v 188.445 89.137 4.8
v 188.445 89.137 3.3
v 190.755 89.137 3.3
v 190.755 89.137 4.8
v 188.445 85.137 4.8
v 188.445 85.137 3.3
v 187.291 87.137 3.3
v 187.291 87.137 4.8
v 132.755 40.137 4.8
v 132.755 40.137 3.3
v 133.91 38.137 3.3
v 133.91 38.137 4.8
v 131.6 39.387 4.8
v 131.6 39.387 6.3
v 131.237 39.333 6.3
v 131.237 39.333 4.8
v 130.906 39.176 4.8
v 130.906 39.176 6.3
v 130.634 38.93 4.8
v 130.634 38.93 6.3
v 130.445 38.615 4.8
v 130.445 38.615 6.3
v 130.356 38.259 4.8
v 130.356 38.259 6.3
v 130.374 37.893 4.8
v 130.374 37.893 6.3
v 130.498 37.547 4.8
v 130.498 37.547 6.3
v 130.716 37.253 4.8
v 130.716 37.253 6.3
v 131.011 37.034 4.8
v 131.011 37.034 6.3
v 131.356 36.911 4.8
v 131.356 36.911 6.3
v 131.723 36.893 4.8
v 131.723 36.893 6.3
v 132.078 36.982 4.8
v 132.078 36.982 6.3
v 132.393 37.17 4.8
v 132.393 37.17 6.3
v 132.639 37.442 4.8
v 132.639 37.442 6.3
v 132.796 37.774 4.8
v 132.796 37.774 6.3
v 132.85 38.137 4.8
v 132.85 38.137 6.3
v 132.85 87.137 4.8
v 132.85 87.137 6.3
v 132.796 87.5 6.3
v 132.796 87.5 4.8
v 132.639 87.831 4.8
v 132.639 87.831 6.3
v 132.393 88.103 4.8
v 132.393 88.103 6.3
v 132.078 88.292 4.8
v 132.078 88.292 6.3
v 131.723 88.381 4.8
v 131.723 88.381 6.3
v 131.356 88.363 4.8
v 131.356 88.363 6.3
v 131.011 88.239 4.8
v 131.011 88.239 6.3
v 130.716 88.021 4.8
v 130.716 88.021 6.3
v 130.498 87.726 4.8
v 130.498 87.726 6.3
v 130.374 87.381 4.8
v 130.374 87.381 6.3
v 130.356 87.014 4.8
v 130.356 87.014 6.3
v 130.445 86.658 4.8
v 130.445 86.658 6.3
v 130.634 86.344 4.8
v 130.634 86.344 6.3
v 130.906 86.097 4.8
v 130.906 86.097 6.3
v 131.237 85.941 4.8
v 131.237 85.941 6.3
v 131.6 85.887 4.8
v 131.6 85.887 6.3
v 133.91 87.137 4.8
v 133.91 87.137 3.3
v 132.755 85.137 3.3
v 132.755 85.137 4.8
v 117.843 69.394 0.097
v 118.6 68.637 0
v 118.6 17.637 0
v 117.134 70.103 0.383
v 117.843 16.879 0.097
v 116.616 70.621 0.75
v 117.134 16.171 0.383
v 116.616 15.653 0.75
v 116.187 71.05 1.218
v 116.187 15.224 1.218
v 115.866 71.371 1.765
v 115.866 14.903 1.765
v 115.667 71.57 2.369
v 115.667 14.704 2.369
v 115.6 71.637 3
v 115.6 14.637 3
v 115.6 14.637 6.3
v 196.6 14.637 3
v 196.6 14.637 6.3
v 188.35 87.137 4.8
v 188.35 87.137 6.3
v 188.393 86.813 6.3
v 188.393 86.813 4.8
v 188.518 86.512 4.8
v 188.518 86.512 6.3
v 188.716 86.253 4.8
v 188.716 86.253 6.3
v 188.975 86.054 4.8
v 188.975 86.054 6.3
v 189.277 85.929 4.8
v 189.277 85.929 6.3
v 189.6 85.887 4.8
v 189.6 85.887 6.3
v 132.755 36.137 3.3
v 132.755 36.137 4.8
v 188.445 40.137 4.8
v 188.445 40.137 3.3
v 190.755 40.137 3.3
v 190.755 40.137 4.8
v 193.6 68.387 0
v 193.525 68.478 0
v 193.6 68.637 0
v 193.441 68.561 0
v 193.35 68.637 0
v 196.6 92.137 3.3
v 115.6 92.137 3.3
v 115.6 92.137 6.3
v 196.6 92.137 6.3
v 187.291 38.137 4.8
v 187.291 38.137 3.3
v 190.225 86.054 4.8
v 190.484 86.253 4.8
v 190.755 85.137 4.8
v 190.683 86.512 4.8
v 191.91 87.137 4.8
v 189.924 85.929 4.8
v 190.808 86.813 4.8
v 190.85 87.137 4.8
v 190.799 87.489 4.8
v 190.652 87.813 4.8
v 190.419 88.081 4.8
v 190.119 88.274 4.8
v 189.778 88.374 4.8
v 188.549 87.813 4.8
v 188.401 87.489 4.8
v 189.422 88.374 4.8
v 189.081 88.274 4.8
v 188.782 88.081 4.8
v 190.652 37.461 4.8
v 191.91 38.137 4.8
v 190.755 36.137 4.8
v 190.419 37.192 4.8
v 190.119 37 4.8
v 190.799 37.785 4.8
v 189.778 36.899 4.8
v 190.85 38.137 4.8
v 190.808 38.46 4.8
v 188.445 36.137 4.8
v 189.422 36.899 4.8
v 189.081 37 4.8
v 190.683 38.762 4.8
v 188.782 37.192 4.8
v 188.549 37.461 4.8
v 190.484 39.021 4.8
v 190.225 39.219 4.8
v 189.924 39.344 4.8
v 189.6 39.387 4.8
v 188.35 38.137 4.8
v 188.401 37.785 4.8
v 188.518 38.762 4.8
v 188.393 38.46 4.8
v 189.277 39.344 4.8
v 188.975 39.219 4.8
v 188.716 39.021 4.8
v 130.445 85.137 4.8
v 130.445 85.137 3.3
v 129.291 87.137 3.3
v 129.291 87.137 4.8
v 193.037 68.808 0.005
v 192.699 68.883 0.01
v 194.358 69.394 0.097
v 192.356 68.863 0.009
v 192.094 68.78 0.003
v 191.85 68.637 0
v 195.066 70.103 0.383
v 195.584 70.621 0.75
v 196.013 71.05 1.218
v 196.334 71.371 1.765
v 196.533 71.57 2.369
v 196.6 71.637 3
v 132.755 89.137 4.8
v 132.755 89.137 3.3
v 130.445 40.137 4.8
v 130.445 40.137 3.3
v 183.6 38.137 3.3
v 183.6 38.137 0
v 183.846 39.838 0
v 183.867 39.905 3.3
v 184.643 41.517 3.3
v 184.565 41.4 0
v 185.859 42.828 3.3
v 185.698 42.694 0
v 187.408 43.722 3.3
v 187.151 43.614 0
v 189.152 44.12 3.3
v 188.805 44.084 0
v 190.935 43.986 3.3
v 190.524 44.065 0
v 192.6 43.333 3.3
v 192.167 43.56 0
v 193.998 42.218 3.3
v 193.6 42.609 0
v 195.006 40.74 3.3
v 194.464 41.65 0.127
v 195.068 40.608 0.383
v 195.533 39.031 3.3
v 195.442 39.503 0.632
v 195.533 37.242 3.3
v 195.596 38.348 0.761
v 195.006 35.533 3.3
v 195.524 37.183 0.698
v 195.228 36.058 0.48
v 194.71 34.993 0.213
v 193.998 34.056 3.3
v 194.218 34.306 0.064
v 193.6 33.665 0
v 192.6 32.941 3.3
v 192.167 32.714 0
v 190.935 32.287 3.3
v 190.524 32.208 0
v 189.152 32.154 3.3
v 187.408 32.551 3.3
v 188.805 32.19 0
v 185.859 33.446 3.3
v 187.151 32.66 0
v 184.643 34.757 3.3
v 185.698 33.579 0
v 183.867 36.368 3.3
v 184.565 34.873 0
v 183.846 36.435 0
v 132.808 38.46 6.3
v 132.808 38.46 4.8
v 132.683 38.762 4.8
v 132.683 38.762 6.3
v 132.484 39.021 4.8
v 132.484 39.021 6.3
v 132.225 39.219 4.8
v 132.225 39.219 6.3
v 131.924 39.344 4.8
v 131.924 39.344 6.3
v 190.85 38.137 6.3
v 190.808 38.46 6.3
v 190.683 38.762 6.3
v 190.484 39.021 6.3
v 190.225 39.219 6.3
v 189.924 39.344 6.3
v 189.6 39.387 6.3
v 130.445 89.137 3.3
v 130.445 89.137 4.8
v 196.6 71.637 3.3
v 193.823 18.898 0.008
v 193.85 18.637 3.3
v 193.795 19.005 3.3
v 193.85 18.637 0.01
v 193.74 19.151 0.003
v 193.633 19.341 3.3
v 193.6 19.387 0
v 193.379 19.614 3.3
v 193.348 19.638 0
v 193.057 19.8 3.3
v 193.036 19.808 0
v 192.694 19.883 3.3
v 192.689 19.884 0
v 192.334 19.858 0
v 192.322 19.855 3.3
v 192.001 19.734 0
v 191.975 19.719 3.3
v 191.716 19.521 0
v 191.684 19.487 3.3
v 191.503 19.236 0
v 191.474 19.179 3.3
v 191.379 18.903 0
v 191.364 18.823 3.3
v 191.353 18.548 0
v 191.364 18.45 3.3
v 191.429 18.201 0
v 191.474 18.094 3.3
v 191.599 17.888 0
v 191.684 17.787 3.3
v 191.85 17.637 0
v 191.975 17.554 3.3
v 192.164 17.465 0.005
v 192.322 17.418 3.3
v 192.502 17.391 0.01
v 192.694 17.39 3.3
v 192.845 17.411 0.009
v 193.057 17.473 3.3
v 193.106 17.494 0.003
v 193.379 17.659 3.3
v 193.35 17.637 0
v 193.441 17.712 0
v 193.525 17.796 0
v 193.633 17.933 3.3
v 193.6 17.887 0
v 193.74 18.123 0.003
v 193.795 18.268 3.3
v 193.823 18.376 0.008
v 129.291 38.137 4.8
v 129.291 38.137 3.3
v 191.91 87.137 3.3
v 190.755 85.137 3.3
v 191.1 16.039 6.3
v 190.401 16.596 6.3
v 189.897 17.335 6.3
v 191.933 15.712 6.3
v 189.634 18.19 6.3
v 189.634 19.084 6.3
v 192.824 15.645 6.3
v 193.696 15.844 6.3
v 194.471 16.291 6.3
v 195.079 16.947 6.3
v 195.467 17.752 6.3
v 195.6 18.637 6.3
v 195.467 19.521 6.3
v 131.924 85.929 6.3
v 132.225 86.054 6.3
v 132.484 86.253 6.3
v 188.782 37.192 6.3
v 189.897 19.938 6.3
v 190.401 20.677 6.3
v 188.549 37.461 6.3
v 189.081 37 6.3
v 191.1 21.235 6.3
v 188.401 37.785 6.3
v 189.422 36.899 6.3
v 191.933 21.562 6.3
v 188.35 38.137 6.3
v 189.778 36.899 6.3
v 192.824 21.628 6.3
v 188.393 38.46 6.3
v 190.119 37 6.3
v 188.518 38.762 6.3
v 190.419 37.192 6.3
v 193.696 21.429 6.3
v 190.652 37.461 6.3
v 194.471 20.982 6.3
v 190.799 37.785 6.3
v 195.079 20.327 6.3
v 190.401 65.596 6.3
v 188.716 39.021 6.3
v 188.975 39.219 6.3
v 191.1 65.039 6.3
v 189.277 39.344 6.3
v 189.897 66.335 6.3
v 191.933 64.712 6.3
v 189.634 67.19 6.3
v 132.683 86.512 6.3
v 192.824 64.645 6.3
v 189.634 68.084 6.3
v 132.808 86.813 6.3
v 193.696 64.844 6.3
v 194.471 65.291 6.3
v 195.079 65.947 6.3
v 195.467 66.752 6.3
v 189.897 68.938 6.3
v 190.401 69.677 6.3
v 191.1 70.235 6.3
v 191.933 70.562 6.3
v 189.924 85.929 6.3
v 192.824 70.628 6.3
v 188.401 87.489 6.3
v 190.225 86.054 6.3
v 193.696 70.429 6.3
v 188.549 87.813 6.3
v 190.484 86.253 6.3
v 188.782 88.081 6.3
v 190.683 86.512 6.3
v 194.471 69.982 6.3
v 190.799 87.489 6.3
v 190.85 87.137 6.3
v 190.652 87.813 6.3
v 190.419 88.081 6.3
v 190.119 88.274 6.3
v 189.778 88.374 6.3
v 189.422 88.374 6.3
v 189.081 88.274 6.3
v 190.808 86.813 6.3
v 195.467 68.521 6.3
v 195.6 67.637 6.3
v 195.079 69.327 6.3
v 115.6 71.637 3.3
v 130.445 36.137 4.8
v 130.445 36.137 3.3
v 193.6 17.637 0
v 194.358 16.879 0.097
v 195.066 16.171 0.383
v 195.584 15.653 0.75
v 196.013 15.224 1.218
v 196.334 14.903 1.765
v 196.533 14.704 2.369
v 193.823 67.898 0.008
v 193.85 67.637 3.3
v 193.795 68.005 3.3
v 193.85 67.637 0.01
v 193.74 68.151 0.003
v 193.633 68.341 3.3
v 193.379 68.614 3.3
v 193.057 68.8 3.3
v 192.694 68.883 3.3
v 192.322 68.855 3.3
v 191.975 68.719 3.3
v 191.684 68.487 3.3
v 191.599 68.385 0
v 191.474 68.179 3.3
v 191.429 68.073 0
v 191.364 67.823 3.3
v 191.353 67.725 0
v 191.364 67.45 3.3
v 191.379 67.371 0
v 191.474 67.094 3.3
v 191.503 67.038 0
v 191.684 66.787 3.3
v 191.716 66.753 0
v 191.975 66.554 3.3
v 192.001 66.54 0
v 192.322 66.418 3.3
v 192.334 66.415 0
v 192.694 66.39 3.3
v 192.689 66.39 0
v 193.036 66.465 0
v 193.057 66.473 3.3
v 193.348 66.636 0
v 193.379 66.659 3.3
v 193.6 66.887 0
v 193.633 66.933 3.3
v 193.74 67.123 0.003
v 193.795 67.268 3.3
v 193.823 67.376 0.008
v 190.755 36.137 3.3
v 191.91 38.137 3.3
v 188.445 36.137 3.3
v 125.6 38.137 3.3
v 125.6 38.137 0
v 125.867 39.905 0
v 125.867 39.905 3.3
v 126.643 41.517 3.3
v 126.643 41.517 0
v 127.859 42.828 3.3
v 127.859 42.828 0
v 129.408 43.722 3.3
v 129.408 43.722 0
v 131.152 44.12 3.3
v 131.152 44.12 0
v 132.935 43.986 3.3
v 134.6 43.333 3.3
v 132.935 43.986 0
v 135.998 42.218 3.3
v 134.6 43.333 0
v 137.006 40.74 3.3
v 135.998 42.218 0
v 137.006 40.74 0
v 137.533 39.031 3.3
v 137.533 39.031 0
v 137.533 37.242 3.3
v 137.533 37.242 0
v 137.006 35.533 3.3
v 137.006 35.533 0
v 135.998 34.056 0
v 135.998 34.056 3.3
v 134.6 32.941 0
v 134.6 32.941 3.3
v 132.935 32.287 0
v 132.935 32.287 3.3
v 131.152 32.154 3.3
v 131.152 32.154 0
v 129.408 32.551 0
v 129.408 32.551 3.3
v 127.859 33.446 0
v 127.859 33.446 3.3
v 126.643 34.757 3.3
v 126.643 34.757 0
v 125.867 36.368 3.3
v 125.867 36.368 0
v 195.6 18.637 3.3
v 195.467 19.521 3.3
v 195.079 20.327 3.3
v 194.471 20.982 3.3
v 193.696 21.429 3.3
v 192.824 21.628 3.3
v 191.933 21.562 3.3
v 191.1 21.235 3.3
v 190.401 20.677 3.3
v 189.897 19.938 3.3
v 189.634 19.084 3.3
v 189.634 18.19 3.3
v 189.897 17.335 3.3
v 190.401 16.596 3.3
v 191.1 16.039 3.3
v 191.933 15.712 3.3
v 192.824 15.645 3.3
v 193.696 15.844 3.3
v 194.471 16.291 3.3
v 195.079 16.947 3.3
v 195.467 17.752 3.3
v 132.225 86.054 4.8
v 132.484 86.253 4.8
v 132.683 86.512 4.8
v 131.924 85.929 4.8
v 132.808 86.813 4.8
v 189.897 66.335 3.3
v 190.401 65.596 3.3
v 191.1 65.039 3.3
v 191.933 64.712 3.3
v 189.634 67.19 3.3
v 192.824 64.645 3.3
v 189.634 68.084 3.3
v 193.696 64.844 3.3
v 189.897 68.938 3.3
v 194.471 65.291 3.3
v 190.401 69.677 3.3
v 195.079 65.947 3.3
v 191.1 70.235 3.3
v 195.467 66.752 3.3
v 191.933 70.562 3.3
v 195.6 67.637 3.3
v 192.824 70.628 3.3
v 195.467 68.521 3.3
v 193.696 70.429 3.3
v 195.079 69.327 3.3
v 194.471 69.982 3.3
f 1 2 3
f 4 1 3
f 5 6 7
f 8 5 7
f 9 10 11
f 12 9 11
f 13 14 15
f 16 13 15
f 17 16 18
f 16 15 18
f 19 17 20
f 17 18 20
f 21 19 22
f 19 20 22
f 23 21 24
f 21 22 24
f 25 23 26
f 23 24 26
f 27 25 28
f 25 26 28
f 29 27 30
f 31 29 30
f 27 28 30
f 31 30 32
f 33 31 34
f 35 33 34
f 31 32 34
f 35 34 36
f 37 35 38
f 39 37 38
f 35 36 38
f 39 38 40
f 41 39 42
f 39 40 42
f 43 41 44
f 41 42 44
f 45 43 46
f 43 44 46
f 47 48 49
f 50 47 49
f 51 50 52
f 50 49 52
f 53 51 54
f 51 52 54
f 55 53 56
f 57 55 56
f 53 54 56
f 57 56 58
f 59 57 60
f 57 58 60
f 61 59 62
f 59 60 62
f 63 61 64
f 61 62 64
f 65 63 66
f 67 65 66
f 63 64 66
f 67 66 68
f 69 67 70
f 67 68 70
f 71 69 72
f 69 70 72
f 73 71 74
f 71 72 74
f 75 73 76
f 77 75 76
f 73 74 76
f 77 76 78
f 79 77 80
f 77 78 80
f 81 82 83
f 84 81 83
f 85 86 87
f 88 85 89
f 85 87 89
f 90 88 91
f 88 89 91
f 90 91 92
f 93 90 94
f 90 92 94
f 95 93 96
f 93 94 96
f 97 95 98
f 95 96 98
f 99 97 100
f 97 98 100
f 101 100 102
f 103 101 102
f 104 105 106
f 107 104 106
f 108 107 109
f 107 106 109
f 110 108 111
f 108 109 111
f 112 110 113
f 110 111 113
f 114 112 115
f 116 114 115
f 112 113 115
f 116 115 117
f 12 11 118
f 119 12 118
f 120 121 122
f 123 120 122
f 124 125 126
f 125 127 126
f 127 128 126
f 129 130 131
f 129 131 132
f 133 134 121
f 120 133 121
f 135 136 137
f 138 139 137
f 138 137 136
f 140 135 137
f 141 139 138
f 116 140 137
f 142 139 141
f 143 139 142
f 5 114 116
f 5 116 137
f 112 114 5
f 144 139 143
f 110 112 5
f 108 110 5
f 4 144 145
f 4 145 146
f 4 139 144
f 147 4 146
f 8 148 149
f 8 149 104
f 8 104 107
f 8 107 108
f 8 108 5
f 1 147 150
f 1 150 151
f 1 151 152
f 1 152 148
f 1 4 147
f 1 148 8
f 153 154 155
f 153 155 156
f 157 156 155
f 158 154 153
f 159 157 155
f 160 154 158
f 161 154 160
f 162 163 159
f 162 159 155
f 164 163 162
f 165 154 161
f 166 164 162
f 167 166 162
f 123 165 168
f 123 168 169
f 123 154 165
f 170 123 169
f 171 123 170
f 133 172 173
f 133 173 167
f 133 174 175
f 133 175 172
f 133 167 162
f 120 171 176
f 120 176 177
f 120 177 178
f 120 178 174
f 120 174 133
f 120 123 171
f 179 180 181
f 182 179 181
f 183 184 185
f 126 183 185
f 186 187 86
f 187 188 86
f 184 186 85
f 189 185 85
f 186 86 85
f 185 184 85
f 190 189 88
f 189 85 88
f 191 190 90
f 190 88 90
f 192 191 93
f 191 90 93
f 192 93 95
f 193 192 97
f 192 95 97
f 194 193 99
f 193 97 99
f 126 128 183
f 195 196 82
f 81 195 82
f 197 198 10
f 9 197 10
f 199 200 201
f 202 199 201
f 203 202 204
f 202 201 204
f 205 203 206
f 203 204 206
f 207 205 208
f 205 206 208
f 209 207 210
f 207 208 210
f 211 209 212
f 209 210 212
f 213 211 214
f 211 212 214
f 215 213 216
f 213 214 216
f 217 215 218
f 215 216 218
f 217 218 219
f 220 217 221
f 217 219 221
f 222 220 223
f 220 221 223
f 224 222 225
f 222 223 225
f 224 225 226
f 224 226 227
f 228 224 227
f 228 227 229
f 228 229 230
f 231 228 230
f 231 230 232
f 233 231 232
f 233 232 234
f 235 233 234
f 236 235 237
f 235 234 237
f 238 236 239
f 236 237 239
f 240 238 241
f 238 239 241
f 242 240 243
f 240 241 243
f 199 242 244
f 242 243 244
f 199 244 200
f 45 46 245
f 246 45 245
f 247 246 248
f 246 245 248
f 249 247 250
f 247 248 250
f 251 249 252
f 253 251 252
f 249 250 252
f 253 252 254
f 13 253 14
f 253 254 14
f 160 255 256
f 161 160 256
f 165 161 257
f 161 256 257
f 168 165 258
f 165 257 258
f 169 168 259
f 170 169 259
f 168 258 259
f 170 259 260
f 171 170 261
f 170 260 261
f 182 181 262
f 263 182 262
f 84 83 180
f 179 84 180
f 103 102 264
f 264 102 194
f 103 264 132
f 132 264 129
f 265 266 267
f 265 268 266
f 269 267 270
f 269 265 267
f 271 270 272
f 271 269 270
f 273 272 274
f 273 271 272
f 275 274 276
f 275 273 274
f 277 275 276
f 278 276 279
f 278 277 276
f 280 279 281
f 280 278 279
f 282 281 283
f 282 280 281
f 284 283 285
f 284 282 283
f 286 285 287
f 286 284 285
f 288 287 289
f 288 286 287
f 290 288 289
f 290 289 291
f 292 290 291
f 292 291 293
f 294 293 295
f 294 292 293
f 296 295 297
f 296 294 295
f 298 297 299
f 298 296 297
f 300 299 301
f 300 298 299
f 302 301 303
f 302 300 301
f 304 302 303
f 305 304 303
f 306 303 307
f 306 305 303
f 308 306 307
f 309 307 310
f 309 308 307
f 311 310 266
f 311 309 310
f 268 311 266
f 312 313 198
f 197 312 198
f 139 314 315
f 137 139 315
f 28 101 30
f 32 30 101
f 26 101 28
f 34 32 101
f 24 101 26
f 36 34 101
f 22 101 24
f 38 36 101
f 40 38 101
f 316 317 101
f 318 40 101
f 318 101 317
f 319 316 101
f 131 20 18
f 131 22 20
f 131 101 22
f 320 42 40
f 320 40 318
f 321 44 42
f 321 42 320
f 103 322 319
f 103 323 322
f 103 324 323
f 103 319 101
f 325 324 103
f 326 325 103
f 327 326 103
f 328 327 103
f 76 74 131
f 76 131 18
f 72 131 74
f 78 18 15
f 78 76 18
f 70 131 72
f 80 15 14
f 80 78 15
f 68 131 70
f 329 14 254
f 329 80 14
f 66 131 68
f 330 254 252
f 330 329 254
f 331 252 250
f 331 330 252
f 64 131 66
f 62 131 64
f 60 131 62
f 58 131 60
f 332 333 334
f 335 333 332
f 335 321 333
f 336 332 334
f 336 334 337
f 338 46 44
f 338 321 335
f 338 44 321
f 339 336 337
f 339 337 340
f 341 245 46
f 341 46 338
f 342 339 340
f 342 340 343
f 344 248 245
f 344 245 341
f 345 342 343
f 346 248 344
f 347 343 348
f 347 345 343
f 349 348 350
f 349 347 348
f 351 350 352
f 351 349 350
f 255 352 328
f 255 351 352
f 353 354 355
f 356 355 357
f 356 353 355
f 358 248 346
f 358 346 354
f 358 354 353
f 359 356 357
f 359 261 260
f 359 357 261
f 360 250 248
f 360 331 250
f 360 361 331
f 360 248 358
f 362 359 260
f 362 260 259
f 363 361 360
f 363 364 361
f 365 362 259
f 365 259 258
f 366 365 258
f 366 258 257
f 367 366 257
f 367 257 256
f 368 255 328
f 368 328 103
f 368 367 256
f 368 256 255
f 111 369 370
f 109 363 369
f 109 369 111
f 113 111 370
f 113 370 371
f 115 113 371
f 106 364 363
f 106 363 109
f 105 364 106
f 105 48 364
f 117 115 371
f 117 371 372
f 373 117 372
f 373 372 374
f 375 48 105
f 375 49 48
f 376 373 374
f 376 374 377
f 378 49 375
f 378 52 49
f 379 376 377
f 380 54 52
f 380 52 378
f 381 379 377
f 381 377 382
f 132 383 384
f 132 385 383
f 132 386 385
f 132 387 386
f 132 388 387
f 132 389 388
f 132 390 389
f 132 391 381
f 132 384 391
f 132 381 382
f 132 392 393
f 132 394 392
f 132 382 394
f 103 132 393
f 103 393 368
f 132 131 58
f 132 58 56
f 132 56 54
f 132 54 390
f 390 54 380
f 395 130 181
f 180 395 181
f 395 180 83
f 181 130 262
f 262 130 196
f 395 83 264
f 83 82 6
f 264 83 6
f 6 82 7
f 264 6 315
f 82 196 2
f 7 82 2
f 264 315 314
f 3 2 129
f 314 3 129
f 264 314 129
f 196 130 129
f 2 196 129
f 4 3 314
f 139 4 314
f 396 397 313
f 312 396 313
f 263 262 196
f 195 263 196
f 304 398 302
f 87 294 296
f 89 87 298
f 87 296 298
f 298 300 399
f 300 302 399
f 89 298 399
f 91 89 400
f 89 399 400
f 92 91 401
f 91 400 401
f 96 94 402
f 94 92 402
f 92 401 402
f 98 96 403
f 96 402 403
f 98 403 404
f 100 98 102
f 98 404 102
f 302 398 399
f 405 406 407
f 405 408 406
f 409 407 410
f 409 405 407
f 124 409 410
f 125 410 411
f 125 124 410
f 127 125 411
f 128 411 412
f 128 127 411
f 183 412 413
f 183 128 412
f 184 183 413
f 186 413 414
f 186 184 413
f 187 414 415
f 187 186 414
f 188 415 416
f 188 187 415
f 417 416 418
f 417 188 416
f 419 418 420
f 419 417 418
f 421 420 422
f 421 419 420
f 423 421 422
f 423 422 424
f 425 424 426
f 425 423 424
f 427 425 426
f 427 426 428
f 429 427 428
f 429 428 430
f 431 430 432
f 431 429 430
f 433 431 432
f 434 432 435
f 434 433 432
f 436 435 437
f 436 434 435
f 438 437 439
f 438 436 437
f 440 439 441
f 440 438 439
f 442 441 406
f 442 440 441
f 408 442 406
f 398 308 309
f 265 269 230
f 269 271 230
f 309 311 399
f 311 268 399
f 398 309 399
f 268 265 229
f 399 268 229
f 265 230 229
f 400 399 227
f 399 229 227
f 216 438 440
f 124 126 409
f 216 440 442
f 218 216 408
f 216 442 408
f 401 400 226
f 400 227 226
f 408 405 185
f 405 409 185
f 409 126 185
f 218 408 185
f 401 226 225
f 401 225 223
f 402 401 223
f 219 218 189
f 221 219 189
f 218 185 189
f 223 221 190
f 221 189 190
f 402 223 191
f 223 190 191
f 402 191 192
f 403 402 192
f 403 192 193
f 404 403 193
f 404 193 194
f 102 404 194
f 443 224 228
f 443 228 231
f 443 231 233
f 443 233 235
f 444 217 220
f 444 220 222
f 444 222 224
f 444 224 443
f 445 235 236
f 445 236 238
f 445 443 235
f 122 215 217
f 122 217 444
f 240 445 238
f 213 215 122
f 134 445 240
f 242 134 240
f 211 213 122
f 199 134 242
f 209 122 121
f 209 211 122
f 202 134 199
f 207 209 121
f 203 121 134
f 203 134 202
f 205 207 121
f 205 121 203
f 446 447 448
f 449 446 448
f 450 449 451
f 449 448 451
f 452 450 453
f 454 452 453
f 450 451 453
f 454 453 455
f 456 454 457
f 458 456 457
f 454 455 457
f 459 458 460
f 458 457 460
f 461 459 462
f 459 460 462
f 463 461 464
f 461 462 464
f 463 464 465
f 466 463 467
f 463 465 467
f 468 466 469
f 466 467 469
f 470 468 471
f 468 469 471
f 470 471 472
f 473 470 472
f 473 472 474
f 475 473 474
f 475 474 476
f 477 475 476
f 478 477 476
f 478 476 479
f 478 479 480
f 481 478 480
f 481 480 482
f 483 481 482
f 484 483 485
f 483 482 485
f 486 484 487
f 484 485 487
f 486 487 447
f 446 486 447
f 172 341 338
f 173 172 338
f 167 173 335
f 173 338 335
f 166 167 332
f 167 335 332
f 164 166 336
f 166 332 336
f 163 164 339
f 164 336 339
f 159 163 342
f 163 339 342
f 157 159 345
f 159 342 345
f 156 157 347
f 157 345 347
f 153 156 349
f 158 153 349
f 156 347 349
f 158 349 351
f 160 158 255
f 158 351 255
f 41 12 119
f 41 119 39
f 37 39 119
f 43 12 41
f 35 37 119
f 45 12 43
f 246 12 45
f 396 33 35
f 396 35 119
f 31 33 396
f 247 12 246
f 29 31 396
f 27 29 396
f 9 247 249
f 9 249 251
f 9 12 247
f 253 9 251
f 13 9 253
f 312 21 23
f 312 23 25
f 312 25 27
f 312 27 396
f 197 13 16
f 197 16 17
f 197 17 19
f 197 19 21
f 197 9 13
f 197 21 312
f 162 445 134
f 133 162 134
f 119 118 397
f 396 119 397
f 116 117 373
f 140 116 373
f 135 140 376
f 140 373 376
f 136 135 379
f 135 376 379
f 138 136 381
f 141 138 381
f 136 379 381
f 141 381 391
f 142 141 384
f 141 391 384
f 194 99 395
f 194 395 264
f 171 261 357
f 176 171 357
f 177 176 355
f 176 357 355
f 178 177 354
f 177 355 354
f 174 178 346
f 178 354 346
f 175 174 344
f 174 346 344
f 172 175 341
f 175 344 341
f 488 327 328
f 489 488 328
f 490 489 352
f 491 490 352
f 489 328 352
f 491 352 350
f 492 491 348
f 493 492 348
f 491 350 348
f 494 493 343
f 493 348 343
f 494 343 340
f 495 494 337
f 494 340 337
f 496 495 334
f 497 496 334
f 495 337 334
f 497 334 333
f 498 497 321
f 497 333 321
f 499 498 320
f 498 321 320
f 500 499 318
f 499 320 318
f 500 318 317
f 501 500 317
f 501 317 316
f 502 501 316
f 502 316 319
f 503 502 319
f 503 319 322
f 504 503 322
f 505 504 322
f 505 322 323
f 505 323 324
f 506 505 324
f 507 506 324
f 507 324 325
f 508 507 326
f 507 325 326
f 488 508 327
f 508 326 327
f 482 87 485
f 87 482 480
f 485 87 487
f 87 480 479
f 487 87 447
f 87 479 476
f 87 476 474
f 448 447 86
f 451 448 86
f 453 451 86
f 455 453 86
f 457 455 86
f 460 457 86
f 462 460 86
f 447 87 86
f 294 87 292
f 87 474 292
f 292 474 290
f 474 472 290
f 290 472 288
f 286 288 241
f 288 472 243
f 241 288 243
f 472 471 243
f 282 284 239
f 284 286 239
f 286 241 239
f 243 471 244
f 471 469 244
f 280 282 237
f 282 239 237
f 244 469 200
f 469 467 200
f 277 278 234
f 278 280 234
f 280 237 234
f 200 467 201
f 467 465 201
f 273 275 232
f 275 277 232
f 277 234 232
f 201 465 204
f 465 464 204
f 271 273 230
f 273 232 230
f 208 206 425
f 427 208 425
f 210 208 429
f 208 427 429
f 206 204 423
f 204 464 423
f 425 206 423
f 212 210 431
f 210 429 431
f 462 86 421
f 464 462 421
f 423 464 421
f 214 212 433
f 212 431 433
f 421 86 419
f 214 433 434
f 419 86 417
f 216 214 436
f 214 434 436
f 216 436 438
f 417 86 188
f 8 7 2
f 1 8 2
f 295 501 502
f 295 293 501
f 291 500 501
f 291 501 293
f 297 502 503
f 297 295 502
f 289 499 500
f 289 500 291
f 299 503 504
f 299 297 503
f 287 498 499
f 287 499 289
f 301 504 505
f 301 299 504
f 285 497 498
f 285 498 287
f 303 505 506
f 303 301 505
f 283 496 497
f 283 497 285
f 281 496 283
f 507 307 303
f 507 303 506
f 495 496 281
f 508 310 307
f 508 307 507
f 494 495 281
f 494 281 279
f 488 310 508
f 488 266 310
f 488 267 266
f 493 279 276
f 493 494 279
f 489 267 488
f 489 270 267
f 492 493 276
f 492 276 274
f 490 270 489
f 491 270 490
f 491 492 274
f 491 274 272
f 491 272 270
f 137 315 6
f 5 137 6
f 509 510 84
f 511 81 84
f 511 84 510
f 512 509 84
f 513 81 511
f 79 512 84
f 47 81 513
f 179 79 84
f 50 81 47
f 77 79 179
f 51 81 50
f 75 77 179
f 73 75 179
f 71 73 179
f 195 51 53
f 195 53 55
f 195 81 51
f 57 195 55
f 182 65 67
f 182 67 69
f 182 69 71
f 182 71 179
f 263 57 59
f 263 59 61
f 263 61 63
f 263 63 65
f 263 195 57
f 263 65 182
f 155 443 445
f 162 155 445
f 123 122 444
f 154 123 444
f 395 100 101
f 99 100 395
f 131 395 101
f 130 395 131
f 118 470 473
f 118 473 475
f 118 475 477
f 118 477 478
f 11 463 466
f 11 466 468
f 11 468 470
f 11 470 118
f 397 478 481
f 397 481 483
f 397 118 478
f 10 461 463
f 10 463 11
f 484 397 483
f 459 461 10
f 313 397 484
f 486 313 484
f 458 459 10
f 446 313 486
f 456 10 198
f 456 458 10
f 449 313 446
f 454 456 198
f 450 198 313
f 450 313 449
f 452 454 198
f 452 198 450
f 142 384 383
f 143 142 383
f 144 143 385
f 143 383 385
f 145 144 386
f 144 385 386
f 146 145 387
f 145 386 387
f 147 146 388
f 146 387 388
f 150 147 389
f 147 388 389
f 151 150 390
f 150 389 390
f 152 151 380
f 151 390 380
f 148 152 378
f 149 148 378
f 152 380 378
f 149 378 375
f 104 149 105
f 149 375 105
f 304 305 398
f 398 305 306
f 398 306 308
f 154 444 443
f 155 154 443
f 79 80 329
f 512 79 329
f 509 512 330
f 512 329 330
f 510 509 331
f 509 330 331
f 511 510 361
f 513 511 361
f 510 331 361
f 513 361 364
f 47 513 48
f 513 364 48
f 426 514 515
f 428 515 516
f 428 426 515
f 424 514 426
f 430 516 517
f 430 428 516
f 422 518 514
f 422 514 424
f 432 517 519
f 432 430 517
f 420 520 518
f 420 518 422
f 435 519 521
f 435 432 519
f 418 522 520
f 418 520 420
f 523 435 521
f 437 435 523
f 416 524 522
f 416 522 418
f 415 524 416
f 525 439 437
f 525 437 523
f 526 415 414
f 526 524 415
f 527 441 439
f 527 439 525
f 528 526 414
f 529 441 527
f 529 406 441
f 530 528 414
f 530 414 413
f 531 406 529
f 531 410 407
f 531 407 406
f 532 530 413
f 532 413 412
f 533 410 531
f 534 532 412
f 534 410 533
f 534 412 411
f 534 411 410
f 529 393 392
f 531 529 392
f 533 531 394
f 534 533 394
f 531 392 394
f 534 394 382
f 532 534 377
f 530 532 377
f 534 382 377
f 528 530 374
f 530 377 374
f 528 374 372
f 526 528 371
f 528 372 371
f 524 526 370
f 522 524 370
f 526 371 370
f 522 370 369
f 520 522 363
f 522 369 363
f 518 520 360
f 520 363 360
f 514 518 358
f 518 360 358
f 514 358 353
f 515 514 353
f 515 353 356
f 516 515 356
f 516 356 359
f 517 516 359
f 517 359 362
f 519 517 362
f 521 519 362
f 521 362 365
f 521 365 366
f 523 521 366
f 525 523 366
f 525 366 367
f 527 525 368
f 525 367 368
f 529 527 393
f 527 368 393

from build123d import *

# Parameters (mm, degrees)
SKETCH1_W           = 81
SKETCH1_H           = 57
SKETCH1_R           = 1.25
BOSS_EXTRUDE1_DEPTH = 3.3
SKETCH2_W           = 81
SKETCH2_H           = 77.5
SKETCH2_R           = 1.25
BOSS_EXTRUDE2_DEPTH = 3
CUT_EXTRUDE1_DEPTH  = 218.210667029
SKETCH4_R           = 6
CUT_EXTRUDE2_DEPTH  = 3.3
CUT_EXTRUDE3_DEPTH  = 1.5
SKETCH6_R           = 3
CUT_EXTRUDE4_DEPTH  = 3
FILLET1_R           = 3


with BuildPart() as part:
    # Sketch1 → Boss-Extrude1 (new body)
    with BuildSketch(Plane.XY):
        with Locations((156.100114143, 43.136740717)):
            Rectangle(SKETCH1_W, SKETCH1_H)
        with Locations((192.600114143, 18.636740717)):
            Circle(SKETCH1_R, mode=Mode.SUBTRACT)
        with Locations((192.600114143, 67.636740717)):
            Circle(SKETCH1_R, mode=Mode.SUBTRACT)
    extrude(amount=BOSS_EXTRUDE1_DEPTH)

    # Sketch2 → Boss-Extrude2 (add)
    with BuildSketch(Plane.XY.offset(3.3)):
        with Locations((156.100114143, 53.386740717)):
            Rectangle(SKETCH2_W, SKETCH2_H)
        with Locations((192.600114143, 67.636740717)):
            Circle(SKETCH2_R, mode=Mode.SUBTRACT)
        with Locations((192.600114143, 18.636740717)):
            Circle(SKETCH2_R, mode=Mode.SUBTRACT)
    extrude(amount=BOSS_EXTRUDE2_DEPTH)

    # Sketch3 → Cut-Extrude1 (cut, through all)
    with BuildSketch(Plane.XY.offset(6.3)):
        with BuildLine():
            Line((131.600114143, 85.886740717), (131.600114143, 87.136740717))
            Line((131.600114143, 87.136740717), (132.850114143, 87.136740717))
            ThreePointArc((132.850114143, 87.136740717), (130.716230667, 88.020624193), (131.600114143, 85.886740717))
        make_face()
        with BuildLine():
            Line((132.850114143, 87.136740717), (131.600114143, 87.136740717))
            Line((131.600114143, 87.136740717), (131.600114143, 85.886740717))
            ThreePointArc((131.600114143, 85.886740717), (132.48399762, 86.25285724), (132.850114143, 87.136740717))
        make_face()
        with BuildLine():
            ThreePointArc((190.850114143, 87.136740717), (189.600114143, 88.386740717), (188.350114143, 87.136740717))
            Line((188.350114143, 87.136740717), (189.600114143, 87.136740717))
            Line((189.600114143, 87.136740717), (189.600114143, 85.886740717))
            ThreePointArc((189.600114143, 85.886740717), (190.48399762, 86.25285724), (190.850114143, 87.136740717))
        make_face()
        with BuildLine():
            Line((189.600114143, 87.136740717), (188.350114143, 87.136740717))
            ThreePointArc((188.350114143, 87.136740717), (188.716230667, 86.25285724), (189.600114143, 85.886740717))
            Line((189.600114143, 85.886740717), (189.600114143, 87.136740717))
        make_face()
        with BuildLine():
            ThreePointArc((190.850114143, 38.136740717), (190.48399762, 39.020624193), (189.600114143, 39.386740717))
            Line((189.600114143, 39.386740717), (189.600114143, 38.136740717))
            Line((189.600114143, 38.136740717), (188.350114143, 38.136740717))
            ThreePointArc((188.350114143, 38.136740717), (189.600114143, 36.886740717), (190.850114143, 38.136740717))
        make_face()
        with BuildLine():
            Line((189.600114143, 38.136740717), (189.600114143, 39.386740717))
            ThreePointArc((189.600114143, 39.386740717), (188.716230667, 39.020624193), (188.350114143, 38.136740717))
            Line((188.350114143, 38.136740717), (189.600114143, 38.136740717))
        make_face()
        with BuildLine():
            ThreePointArc((132.850114143, 38.136740717), (132.48399762, 39.020624193), (131.600114143, 39.386740717))
            Line((131.600114143, 39.386740717), (131.600114143, 38.136740717))
            Line((131.600114143, 38.136740717), (132.850114143, 38.136740717))
        make_face()
        with BuildLine():
            Line((131.600114143, 38.136740717), (131.600114143, 39.386740717))
            ThreePointArc((131.600114143, 39.386740717), (130.716230667, 37.25285724), (132.850114143, 38.136740717))
            Line((132.850114143, 38.136740717), (131.600114143, 38.136740717))
        make_face()
    extrude(amount=-CUT_EXTRUDE1_DEPTH, mode=Mode.SUBTRACT)

    # Sketch4 → Cut-Extrude2 (cut)
    with BuildSketch(Plane(origin=(0, 0, 0), x_dir=(-1, 0, 0), z_dir=(0, 0, -1))):
        with Locations((-189.600114143, 38.136740717)):
            Circle(SKETCH4_R)
        with Locations((-131.600114143, 38.136740717)):
            Circle(SKETCH4_R)
    extrude(amount=-CUT_EXTRUDE2_DEPTH, mode=Mode.SUBTRACT)

    # Sketch5 → Cut-Extrude3 (cut)
    with BuildSketch(Plane(origin=(0, 0, 3.3), x_dir=(-1, 0, 0), z_dir=(0, 0, -1))):
        Polygon((-187.290713067, 87.136740717), (-188.445413605, 89.136740717), (-190.754814682, 89.136740717), (-191.90951522, 87.136740717), (-190.754814682, 85.136740717), (-188.445413605, 85.136740717), align=None)
        Polygon((-129.290713067, 87.136740717), (-130.445413605, 89.136740717), (-132.754814682, 89.136740717), (-133.90951522, 87.136740717), (-132.754814682, 85.136740717), (-130.445413605, 85.136740717), align=None)
        Polygon((-130.445413605, 40.136740717), (-132.754814682, 40.136740717), (-133.90951522, 38.136740717), (-132.754814682, 36.136740717), (-130.445413605, 36.136740717), (-129.290713067, 38.136740717), align=None)
        Polygon((-187.290713067, 38.136740717), (-188.445413605, 40.136740717), (-190.754814682, 40.136740717), (-191.90951522, 38.136740717), (-190.754814682, 36.136740717), (-188.445413605, 36.136740717), align=None)
    extrude(amount=-CUT_EXTRUDE3_DEPTH, mode=Mode.SUBTRACT)

    # Sketch6 → Cut-Extrude4 (cut)
    with BuildSketch(Plane.XY.offset(6.3)):
        with Locations((192.600114143, 67.636740717)):
            Circle(SKETCH6_R)
        with Locations((192.600114143, 18.636740717)):
            Circle(SKETCH6_R)
    extrude(amount=-CUT_EXTRUDE4_DEPTH, mode=Mode.SUBTRACT)

    # Fillet1
    # the kernel refuses this fillet: 3 mm, written as the material it takes off along each edge
    with BuildSketch(Plane(origin=(108.100114143, 71.636740717, 0), x_dir=(0, 0, 1), z_dir=(1, 0, 0))) as fillet1_piece_1:
        with BuildLine():
            CenterArc((FILLET1_R, FILLET1_R), FILLET1_R, 180, 90)
            Line((0, FILLET1_R), (0, 0))
            Line((0, 0), (FILLET1_R, 0))
        make_face()
    extrude(amount=96, mode=Mode.SUBTRACT)
    with BuildSketch(Plane(origin=(196.600114143, 79.136740717, 0), x_dir=(0, 0, 1), z_dir=(0, -1, 0)), Plane(origin=(115.600114143, 7.136740717, 0), x_dir=(0, 0, 1), z_dir=(0, 1, 0))) as fillet1_piece_2:
        with BuildLine():
            CenterArc((FILLET1_R, FILLET1_R), FILLET1_R, 180, 90)
            Line((0, FILLET1_R), (0, 0))
            Line((0, 0), (FILLET1_R, 0))
        make_face()
    extrude(amount=72, mode=Mode.SUBTRACT)
    with BuildSketch(Plane(origin=(204.100114143, 14.636740717, 0), x_dir=(0, 1, 0), z_dir=(-1, 0, 0))) as fillet1_piece_3:
        with BuildLine():
            CenterArc((FILLET1_R, -FILLET1_R), FILLET1_R, 90, 90)
            Line((0, -FILLET1_R), (0, 0))
            Line((0, 0), (FILLET1_R, 0))
        make_face()
    extrude(amount=96, mode=Mode.SUBTRACT)


solid = part.part
